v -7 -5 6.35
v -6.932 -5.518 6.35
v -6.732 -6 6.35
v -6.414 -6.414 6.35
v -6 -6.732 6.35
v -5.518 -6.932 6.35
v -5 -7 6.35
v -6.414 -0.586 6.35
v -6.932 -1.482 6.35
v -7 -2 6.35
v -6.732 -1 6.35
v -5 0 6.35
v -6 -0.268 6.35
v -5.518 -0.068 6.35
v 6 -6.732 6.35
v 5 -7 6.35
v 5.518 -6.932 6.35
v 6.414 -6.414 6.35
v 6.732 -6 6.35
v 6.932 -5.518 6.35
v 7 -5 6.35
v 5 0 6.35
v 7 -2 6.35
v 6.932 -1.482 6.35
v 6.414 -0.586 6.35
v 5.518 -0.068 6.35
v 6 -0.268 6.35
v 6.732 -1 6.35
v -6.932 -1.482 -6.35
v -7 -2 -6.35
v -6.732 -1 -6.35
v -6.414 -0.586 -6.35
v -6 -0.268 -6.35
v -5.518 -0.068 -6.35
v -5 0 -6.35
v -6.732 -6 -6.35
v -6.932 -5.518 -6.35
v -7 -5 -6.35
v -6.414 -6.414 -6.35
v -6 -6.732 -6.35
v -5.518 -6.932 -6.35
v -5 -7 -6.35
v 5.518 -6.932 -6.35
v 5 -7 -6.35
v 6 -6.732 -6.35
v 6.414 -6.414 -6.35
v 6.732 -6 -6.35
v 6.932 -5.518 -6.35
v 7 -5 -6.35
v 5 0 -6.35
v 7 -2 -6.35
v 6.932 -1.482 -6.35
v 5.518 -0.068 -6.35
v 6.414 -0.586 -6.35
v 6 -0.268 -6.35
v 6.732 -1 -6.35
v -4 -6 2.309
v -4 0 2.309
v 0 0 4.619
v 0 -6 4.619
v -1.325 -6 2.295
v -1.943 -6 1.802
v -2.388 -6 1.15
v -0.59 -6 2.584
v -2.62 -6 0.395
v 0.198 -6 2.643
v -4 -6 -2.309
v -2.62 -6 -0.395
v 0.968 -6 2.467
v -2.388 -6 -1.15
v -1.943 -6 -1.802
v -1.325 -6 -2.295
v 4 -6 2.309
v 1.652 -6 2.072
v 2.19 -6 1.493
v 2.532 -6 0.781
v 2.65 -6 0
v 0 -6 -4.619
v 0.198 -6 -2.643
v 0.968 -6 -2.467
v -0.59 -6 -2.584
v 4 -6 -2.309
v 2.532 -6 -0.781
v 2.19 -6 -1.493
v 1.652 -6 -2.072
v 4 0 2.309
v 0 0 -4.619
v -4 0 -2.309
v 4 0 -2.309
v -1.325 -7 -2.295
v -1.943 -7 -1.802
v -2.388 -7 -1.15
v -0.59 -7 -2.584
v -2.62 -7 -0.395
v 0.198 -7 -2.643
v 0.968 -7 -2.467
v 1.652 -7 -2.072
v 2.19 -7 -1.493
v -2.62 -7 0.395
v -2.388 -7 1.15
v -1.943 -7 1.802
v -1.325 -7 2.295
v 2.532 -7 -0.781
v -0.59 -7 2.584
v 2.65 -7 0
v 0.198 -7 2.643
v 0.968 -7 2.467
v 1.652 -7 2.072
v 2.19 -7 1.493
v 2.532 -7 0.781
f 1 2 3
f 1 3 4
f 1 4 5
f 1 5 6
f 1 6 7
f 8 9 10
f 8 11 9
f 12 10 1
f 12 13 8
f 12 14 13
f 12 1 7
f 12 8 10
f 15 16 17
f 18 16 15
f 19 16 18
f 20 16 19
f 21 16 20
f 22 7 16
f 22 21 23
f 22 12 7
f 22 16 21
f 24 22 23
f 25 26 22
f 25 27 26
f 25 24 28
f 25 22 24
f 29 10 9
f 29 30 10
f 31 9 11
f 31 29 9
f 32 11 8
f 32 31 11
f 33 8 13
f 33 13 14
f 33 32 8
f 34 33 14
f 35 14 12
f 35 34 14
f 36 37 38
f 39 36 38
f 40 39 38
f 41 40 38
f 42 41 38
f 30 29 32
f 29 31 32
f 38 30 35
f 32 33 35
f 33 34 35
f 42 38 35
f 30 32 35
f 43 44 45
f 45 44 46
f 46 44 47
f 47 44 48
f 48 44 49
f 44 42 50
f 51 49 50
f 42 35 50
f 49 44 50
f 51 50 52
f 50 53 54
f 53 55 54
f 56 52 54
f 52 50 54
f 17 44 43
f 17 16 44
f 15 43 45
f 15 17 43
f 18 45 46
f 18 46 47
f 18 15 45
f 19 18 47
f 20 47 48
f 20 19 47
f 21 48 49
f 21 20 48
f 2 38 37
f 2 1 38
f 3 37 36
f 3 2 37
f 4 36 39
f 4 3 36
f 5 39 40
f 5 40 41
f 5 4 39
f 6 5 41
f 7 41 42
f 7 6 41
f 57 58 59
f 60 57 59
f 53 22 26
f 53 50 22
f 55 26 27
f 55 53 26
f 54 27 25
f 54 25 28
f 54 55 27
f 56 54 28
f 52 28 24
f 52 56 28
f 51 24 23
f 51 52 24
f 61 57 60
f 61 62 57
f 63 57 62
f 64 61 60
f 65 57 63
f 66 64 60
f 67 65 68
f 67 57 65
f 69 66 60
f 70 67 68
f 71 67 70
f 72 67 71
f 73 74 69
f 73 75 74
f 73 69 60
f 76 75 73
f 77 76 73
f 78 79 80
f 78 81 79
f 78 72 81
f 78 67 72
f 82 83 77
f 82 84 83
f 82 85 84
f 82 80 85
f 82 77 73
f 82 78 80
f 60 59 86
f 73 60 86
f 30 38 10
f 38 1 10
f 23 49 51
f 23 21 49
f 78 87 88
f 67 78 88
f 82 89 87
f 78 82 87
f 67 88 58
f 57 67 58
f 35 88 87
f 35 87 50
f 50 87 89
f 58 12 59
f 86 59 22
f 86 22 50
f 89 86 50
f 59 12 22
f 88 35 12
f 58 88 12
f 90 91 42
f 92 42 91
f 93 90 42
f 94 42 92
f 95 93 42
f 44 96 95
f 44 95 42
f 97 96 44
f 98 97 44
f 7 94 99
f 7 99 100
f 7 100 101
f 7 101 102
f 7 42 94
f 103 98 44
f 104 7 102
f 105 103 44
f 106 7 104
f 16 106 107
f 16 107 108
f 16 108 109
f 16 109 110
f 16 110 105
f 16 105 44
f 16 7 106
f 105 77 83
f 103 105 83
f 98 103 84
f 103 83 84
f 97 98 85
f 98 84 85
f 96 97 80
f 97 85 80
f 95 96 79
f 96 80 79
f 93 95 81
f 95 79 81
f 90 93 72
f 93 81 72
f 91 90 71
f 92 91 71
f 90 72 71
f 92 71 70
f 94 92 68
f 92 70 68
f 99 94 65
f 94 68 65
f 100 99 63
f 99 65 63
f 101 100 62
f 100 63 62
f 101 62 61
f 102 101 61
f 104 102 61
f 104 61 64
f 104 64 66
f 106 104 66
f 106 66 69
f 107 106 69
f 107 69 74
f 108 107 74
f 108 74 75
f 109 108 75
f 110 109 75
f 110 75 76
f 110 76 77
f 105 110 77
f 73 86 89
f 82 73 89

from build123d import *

# Parameters (mm, degrees)
SKETCH1_W            = 14
SKETCH1_H            = 7
BOSS_EXTRUDE1_DEPTH  = 6.35
CUT_EXTRUDE1_DEPTH   = 6
FILLET1_R            = 2
M5_CLEARANCE_HOLE1_D = 5.3


with BuildPart() as part:
    # Sketch1 → Boss-Extrude1 (new, symmetric)
    with BuildSketch(Plane.XY):
        with Locations((0, -3.5)):
            Rectangle(SKETCH1_W, SKETCH1_H)
    extrude(amount=BOSS_EXTRUDE1_DEPTH, both=True)

    # Sketch2 → Cut-Extrude1 (cut)
    with BuildSketch(Plane(origin=(0, 0, 0), x_dir=(1, 0, 0), z_dir=(0, 1, 0))):
        Polygon((0, -4.618802154), (4, -2.309401077), (4, 2.309401077), (0, 4.618802154), (-4, 2.309401077), (-4, -2.309401077), align=None)
    extrude(amount=-CUT_EXTRUDE1_DEPTH, mode=Mode.SUBTRACT)

    # Fillet1
    fillet1_edges = [part.edges().sort_by_distance(p)[0] for p in [
        (7, -7, 0),
        (-7, -7, 0),
        (-7, 0, 0),
        (7, 0, 0),
    ]]
    fillet(fillet1_edges, radius=FILLET1_R)

    # M5 Clearance Hole1 (through all)
    with Locations(Plane(origin=(0, -7, 0), x_dir=(-1, 0, 0), z_dir=(0, -1, 0))):
        with Locations((0, 0)):
            Hole(M5_CLEARANCE_HOLE1_D / 2)


solid = part.part
